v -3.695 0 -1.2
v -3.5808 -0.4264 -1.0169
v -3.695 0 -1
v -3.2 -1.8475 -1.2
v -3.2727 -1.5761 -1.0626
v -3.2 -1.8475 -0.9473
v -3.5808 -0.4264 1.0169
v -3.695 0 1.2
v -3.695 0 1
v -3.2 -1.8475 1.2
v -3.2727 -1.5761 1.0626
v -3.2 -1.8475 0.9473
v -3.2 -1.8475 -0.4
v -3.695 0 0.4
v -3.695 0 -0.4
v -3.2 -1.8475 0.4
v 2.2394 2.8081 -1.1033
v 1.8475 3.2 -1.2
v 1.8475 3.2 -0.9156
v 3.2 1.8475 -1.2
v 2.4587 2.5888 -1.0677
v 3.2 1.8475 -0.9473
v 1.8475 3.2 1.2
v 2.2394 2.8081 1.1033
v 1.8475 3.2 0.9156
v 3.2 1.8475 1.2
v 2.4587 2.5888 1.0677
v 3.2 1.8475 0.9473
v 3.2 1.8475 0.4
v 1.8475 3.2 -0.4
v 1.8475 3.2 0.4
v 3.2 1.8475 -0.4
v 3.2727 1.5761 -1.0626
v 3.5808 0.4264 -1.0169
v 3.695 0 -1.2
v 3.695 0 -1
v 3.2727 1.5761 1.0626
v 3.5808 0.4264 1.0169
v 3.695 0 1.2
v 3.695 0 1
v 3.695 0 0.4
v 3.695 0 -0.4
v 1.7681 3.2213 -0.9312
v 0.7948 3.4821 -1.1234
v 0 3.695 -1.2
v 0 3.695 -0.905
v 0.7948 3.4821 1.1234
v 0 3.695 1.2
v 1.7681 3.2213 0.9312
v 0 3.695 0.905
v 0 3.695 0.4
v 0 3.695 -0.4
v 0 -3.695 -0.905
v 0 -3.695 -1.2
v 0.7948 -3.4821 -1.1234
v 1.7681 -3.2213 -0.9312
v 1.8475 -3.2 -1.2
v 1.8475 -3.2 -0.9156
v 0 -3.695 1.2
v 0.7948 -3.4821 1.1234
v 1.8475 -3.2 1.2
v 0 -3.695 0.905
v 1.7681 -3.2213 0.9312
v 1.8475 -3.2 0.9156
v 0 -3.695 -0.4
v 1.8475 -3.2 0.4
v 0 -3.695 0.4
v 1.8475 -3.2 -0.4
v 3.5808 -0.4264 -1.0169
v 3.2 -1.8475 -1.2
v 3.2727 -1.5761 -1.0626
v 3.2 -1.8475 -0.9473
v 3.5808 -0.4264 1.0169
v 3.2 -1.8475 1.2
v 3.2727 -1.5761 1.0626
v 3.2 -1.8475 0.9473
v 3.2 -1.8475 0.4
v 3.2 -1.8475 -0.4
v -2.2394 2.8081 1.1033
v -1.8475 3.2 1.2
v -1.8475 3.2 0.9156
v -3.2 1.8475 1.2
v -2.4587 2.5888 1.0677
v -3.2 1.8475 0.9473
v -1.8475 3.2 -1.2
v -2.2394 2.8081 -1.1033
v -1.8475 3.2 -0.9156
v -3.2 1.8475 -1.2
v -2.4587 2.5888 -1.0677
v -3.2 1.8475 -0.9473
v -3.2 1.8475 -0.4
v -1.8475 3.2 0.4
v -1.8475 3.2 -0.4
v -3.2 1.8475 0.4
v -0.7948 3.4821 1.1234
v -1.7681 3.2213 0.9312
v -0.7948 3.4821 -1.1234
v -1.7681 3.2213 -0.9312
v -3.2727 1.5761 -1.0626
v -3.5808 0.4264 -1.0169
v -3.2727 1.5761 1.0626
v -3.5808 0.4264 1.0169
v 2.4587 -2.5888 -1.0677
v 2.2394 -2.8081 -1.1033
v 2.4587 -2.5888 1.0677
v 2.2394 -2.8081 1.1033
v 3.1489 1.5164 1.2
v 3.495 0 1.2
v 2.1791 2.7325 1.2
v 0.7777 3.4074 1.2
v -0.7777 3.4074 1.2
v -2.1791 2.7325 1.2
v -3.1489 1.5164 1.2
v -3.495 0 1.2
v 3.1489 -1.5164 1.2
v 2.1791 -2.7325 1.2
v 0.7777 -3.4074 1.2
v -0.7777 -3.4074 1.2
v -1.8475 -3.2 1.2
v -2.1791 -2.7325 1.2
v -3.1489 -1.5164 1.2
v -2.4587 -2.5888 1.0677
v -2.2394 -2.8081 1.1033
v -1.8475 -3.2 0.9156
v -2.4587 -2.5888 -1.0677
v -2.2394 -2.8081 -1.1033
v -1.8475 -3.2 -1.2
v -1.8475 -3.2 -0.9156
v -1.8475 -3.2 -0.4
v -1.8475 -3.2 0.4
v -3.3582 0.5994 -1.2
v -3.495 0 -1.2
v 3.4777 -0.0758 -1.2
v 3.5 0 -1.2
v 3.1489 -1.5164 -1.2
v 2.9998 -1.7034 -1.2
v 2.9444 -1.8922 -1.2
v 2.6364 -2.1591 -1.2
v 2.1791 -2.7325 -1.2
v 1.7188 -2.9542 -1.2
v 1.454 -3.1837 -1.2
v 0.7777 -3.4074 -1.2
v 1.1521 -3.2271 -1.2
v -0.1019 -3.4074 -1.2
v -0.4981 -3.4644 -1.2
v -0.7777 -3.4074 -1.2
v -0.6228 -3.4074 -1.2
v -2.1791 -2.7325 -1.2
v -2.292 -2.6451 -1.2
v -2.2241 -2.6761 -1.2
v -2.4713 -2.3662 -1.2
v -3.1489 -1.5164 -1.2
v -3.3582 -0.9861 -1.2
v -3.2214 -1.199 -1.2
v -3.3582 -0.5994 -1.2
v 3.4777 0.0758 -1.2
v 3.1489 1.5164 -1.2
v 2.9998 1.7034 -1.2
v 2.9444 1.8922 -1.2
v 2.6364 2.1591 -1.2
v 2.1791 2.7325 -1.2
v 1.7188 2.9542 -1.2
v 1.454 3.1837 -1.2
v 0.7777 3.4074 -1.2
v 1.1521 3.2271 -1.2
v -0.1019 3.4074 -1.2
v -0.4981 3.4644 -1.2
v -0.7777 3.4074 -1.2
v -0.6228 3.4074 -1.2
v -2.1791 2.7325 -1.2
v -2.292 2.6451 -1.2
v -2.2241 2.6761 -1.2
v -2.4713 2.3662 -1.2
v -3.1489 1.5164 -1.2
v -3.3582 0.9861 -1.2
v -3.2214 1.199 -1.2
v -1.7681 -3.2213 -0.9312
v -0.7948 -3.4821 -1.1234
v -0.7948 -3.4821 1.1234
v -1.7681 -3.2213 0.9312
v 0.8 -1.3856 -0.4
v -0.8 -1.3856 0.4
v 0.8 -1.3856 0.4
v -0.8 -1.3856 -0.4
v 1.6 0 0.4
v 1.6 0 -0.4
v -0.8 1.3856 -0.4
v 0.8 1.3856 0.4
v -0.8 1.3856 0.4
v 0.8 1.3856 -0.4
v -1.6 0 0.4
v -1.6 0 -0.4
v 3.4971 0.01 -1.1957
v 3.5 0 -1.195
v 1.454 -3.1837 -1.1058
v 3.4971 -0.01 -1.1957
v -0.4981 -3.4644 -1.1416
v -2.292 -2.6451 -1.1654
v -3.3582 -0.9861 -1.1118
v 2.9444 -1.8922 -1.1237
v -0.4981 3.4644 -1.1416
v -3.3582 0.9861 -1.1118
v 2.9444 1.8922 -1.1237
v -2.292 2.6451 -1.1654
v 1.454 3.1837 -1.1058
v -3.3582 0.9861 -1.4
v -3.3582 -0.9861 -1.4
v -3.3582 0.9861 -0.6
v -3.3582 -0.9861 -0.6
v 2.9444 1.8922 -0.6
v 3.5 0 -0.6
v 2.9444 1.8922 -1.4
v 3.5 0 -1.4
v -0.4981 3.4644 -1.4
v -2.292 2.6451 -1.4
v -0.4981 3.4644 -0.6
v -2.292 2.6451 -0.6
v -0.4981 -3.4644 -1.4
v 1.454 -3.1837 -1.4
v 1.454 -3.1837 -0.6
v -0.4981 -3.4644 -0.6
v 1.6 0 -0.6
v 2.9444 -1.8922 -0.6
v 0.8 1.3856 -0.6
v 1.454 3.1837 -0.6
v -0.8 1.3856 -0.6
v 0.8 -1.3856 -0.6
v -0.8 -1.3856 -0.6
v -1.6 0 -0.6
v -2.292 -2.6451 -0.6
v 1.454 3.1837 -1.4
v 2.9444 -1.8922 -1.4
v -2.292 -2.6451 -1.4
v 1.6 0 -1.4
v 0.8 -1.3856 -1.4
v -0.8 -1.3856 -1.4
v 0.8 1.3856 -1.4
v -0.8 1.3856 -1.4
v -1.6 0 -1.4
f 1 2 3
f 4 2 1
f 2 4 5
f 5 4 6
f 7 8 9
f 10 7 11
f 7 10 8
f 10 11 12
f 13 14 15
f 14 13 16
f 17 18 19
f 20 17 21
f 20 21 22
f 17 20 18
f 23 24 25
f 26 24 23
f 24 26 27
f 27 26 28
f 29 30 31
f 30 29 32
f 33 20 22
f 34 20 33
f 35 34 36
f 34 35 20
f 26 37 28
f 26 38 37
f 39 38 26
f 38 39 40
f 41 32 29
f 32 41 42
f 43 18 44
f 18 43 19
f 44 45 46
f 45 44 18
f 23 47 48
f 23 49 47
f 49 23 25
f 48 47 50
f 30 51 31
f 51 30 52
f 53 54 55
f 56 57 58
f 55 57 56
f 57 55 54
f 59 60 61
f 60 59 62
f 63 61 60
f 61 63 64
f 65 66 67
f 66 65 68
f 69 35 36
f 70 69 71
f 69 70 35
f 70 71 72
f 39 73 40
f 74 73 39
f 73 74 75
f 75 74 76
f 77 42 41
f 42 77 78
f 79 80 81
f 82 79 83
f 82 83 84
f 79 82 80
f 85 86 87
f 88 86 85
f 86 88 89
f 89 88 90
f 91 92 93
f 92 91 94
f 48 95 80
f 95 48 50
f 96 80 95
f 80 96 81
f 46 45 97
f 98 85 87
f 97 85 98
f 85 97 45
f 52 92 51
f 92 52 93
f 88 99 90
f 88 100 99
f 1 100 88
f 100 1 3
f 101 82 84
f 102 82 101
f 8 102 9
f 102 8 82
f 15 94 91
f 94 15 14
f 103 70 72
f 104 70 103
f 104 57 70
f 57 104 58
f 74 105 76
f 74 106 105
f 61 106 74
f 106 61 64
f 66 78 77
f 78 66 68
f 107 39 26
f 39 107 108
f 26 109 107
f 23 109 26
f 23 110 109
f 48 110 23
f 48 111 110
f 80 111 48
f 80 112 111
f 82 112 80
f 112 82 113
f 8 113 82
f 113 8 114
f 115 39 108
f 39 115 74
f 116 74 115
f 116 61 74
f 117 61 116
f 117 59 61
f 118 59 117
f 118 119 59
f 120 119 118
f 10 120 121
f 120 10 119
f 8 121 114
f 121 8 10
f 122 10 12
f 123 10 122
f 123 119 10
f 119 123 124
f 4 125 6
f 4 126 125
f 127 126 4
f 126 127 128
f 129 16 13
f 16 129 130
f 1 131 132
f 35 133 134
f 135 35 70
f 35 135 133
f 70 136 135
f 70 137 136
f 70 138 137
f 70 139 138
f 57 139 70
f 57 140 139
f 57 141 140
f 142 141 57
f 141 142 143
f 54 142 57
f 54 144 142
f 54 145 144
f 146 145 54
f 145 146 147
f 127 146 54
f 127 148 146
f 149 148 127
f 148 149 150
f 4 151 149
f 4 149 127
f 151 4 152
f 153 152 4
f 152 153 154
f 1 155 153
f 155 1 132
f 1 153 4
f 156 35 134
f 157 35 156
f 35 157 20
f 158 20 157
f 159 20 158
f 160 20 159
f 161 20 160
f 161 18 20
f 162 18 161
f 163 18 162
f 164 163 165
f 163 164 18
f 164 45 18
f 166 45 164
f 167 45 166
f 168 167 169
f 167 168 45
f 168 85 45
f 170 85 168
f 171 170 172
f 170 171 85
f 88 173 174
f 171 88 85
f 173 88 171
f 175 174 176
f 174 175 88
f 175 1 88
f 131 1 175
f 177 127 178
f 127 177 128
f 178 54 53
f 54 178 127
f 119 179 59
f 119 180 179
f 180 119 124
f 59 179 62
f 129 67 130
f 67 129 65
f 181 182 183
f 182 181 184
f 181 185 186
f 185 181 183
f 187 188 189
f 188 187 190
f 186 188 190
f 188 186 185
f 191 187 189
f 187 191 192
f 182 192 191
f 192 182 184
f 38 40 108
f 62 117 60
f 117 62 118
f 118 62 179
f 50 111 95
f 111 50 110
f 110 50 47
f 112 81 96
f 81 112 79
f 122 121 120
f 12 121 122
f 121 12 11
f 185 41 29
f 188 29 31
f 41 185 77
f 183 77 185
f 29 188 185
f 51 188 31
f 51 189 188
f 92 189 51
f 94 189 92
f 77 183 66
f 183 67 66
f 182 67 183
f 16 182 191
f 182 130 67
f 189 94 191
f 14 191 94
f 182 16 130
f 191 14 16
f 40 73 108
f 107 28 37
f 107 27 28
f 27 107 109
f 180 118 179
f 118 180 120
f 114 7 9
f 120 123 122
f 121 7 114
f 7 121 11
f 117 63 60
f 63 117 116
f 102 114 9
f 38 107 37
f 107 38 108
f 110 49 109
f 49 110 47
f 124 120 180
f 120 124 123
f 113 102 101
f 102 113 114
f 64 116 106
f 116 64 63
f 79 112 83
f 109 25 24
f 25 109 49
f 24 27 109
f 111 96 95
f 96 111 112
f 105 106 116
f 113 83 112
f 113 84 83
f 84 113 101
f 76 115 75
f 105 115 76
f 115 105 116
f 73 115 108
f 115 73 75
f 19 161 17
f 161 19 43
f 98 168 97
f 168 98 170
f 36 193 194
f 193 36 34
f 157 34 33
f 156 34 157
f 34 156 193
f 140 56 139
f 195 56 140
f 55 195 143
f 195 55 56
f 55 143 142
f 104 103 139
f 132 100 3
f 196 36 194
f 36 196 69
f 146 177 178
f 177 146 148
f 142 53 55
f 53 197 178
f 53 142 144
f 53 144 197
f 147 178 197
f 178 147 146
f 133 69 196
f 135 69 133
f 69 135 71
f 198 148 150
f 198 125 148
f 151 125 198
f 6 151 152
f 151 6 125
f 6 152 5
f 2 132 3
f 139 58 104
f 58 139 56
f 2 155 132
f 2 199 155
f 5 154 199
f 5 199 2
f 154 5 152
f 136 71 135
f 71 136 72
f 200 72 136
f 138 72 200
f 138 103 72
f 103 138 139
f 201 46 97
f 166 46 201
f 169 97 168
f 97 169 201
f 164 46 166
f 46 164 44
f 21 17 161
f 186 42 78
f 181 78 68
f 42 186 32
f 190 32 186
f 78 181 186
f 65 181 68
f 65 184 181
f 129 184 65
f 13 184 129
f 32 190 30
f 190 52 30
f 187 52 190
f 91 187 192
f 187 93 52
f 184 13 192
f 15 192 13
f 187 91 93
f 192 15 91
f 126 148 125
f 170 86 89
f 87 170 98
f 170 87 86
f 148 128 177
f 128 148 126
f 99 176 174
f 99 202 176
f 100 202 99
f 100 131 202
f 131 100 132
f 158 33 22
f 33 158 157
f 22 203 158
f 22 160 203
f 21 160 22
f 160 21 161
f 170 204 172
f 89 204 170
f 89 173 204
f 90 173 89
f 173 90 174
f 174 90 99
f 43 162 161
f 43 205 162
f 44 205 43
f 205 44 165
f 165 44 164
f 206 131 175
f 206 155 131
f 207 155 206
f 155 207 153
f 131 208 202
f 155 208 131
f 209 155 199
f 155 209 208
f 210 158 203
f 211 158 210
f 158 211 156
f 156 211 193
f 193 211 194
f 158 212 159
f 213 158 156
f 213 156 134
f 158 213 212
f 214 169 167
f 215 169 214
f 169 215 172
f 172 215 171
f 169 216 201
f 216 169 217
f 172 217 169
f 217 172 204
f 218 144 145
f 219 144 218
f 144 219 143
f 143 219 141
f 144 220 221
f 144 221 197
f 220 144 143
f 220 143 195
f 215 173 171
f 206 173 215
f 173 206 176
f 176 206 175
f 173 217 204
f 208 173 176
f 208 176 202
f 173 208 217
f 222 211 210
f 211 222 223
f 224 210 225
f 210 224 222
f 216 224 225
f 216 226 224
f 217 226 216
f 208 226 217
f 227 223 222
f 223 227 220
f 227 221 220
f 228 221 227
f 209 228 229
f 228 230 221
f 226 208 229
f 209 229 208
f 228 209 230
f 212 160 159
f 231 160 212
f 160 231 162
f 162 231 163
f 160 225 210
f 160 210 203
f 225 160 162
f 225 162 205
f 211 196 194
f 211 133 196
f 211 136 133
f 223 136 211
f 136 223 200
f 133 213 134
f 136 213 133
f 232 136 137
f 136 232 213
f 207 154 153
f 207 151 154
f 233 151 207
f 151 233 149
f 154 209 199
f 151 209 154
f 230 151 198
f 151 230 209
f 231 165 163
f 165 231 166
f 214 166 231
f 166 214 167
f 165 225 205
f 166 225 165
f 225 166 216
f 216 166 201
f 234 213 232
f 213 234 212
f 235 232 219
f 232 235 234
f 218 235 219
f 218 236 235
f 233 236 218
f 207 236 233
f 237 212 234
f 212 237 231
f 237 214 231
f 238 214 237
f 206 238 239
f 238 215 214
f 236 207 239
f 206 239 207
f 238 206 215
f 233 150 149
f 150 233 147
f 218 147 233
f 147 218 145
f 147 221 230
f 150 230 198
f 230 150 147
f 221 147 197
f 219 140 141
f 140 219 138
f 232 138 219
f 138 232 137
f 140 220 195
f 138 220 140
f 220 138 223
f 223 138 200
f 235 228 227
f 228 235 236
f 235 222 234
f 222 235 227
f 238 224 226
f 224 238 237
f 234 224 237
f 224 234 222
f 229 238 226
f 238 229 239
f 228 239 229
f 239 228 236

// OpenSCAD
// Parameters
thread_diameter = 3; //[1.5:6:0.1]
thread_pitch = 0.5; //[0.25:1:0.05]
hole_style = 0; //[0:1:1]
hole_clearance = 0.2; //[0:0.6:0.05]
across_flats = 6.4; //[3.2:12.8:0.1]
thickness = 2.4; //[1.2:4.8:0.1]
chamfer_size = 0.2; //[0.1:0.8:0.05]
eps = 0.6; //[0.2:1.5:0.1]
washer_outer_diameter = 7; //[4:14:0.1]
washer_thickness = 0.8; //[0.4:2:0.1]

// Nut and Washer - complete geometry
module nut_and_washer() {
  color("DimGray") {
    // Hex Nut Body
    difference() {
      cylinder(r=across_flats/(2*cos(30)), h=thickness, center=true);
      // Central Thread Hole
      translate([0, 0, 0])
        cylinder(r=(thread_diameter + hole_clearance)/2, h=thickness + 2*eps, center=true);
      // Top Chamfer
      translate([0, 0, thickness/2 - (chamfer_size + eps)/2])
        cylinder(r1=across_flats/(2*cos(30)) + eps, r2=across_flats/(2*cos(30)) - chamfer_size, h=chamfer_size + eps, center=true);
      // Bottom Chamfer
      translate([0, 0, -thickness/2 + (chamfer_size + eps)/2])
        cylinder(r1=across_flats/(2*cos(30)) - chamfer_size, r2=across_flats/(2*cos(30)) + eps, h=chamfer_size + eps, center=true);
    }
    // Washer
    translate([0, 0, -thickness/2 - washer_thickness/2 + eps])
      difference() {
        cylinder(r=washer_outer_diameter/2, h=washer_thickness, center=true);
        cylinder(r=(thread_diameter + hole_clearance)/2, h=washer_thickness + 2*eps, center=true);
      }
  }
}

// Assembly
module assembly() {
  nut_and_washer();
}

assembly();
